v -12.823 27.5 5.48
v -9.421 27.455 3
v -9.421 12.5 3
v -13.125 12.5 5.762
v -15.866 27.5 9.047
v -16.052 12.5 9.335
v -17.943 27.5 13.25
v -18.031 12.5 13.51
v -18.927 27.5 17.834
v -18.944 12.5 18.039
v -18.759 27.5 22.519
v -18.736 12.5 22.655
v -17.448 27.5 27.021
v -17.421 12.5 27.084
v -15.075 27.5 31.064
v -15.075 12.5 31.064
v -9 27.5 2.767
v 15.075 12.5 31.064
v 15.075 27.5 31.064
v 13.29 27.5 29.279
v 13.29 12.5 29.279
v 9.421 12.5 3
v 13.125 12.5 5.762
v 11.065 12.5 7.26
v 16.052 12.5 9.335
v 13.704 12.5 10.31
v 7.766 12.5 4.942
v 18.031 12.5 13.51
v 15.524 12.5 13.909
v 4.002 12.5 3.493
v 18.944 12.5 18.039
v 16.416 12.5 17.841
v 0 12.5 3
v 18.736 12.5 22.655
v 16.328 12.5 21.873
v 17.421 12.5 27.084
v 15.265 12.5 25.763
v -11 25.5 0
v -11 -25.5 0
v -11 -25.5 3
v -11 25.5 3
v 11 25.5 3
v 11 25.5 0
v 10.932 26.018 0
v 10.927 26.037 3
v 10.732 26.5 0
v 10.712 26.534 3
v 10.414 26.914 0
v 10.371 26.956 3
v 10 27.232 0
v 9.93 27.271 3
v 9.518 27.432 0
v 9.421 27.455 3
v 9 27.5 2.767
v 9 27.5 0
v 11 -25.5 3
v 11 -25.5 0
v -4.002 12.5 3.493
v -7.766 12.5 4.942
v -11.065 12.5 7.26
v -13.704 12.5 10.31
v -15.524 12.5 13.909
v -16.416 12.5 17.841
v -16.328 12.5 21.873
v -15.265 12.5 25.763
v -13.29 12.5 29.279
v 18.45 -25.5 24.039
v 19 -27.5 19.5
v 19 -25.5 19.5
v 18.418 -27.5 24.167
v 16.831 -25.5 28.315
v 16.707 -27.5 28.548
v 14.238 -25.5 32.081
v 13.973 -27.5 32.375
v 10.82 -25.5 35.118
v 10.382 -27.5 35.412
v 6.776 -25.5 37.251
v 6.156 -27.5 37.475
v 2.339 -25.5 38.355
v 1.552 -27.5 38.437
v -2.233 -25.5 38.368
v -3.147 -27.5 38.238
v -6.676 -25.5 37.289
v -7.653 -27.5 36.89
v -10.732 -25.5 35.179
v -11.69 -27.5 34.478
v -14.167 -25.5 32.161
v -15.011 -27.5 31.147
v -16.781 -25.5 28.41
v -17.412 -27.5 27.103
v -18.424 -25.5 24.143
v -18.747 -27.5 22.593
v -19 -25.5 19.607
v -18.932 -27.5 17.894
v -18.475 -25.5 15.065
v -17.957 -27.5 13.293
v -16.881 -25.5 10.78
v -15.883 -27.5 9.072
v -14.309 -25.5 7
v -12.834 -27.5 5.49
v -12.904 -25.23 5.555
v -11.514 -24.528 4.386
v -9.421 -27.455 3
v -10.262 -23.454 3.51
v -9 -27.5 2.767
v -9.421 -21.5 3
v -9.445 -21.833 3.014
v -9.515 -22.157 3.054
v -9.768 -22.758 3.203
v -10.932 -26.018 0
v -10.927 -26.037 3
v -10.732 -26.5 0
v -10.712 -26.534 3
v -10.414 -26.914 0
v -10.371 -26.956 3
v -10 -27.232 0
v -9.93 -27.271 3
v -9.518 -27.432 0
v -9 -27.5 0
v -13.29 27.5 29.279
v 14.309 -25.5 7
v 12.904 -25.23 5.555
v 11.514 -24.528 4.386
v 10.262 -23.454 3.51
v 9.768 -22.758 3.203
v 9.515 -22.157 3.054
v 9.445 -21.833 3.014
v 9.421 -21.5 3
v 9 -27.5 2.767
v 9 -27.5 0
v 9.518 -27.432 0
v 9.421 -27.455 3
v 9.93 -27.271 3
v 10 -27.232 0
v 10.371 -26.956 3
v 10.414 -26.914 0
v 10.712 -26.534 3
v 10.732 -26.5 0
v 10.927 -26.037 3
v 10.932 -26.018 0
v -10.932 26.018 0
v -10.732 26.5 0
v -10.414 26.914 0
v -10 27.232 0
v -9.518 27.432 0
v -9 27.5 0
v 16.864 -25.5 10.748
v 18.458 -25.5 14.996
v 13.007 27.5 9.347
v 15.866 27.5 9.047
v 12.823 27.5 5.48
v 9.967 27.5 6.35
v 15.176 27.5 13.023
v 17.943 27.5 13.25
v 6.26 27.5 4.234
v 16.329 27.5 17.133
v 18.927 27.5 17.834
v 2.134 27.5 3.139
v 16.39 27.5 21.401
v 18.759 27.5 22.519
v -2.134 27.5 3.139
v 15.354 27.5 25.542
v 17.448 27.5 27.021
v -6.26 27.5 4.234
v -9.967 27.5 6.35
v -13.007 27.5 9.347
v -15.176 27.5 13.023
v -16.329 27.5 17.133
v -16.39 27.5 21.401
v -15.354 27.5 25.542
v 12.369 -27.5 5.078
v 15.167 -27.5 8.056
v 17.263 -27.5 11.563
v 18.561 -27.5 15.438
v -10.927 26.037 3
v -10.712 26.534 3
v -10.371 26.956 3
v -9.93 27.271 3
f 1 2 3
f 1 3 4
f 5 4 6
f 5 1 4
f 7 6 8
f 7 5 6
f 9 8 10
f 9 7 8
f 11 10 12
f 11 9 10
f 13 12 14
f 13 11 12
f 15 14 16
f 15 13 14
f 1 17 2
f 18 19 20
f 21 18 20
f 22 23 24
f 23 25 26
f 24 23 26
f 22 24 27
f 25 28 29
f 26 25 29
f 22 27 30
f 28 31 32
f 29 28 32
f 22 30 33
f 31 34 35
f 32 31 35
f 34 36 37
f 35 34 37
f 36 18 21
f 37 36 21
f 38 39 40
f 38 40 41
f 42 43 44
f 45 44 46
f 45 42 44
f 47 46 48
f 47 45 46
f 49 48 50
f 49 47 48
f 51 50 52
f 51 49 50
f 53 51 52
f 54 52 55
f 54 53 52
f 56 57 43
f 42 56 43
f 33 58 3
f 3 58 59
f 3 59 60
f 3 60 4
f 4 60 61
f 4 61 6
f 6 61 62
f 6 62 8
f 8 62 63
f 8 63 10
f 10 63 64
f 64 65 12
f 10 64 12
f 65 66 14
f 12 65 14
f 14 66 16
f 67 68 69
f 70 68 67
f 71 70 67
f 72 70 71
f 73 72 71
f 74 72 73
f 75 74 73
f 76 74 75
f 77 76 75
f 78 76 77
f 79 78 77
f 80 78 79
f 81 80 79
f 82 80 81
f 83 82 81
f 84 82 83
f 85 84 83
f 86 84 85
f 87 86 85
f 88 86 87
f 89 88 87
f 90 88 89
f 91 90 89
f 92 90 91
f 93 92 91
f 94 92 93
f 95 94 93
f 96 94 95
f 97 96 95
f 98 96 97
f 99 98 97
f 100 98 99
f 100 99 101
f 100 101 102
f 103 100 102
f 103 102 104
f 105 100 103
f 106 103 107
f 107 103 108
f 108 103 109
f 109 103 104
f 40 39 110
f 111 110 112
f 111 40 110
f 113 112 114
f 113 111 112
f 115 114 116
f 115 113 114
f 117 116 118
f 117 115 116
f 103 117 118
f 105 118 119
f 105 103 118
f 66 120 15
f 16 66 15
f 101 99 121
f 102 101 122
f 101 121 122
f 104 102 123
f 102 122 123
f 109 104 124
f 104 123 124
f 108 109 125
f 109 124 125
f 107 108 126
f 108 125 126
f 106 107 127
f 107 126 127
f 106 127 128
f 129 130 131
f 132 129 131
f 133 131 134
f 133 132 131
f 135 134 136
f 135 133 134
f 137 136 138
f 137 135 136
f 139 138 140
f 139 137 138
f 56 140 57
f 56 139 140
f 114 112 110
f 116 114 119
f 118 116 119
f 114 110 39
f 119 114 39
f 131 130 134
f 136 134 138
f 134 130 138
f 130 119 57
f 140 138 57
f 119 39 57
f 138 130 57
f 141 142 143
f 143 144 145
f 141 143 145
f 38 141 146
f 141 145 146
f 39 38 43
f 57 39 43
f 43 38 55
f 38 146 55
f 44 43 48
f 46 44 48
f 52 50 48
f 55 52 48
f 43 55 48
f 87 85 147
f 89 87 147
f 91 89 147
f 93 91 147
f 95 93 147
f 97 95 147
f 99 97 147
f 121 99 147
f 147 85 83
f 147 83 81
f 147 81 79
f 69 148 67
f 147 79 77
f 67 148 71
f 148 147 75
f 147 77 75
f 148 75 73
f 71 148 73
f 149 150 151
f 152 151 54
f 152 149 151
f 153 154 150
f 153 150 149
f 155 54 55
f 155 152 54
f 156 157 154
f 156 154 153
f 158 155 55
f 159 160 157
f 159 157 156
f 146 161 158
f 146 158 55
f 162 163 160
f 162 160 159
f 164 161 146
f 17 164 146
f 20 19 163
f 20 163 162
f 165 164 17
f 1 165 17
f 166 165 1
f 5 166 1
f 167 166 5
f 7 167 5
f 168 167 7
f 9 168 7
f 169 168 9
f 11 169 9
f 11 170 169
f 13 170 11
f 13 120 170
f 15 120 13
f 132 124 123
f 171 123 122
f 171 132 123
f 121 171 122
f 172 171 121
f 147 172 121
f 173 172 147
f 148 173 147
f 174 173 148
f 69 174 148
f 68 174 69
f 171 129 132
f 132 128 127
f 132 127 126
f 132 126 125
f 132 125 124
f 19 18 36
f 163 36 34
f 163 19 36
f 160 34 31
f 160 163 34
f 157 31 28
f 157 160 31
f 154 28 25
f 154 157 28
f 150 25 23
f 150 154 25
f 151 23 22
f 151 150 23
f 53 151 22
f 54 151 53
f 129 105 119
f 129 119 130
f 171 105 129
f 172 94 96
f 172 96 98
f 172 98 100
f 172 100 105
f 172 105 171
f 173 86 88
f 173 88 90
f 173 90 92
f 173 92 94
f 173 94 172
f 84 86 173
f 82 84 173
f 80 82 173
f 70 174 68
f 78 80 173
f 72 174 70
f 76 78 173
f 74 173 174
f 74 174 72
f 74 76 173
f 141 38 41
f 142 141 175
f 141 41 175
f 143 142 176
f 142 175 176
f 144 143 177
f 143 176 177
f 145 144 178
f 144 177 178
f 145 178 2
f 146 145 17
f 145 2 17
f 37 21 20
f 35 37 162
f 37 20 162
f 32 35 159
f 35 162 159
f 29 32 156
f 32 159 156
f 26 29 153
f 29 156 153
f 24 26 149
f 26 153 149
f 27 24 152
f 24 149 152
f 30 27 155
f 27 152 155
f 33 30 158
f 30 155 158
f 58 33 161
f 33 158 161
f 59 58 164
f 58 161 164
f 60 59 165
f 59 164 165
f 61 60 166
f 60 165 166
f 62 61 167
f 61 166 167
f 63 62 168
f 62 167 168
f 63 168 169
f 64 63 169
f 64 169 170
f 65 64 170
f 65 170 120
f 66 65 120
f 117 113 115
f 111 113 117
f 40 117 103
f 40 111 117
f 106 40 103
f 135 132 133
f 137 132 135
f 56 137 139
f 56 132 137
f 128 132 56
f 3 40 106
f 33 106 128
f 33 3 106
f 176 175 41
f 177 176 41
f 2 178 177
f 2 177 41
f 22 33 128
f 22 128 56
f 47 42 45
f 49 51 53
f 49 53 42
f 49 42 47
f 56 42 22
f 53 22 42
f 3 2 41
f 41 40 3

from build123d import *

# Parameters (mm, degrees)
F0_W     = 22
F0_H     = 55
F1_DEPTH = 3
F2_R     = 2
F4_DEPTH = 2
F5_R     = 4
F6_R     = 19
F6_R_2   = 16.5
F7_DEPTH = 15
F9_DEPTH = 25


with BuildPart() as f1:
    # F0 (on Top) → F1 (new body)
    with BuildSketch(Plane.XY):
        Rectangle(F0_W, F0_H)
    extrude(amount=F1_DEPTH)

    # F2
    f2_edges = [f1.edges().sort_by_distance(p)[0] for p in [
        (-11, 27.5, 1.5),
        (11, 27.5, 1.5),
        (11, -27.5, 1.5),
        (-11, -27.5, 1.5),
    ]]
    fillet(f2_edges, radius=F2_R)

    # F3 (on face) → F4 (join)
    with BuildSketch(Plane.XZ.offset(27.5)):
        with BuildLine():
            Line((-9, 3), (-4.24e-08, 3))
            Line((-4.24e-08, 3), (9, 3))
            Line((9, 3), (9, 2.7667994693))
            ThreePointArc((9, 2.7667994693), (16.3095064303, 9.7532056552), (19, 19.5))
            ThreePointArc((19, 19.5), (-9.7467943448, 35.8095064303), (-9, 2.7667994693))
            Line((-9, 2.7667994693), (-9, 3))
        make_face()
        with BuildLine():
            ThreePointArc((-4.24e-08, 3), (-11.6672618746, 31.1672619046), (16.5, 19.5))
            ThreePointArc((16.5, 19.5), (11.6672618746, 7.8327380954), (-4.24e-08, 3))
        make_face(mode=Mode.SUBTRACT)
        with BuildLine():
            ThreePointArc((-4.24e-08, 3), (11.6672618746, 7.8327380954), (16.5, 19.5))
            ThreePointArc((16.5, 19.5), (-11.6672618746, 31.1672619046), (-4.24e-08, 3))
        make_face()
    extrude(amount=-F4_DEPTH)

    # F5
    f5_edges = [f1.edges().sort_by_distance(p)[0] for p in [
        (0, -25.5, 3),
    ]]
    fillet(f5_edges, radius=F5_R)

    # F6 (on face) → F7 (join)
    with BuildSketch(Plane(origin=(0, 27.5, 0), x_dir=(-1, 0, 0), z_dir=(0, 1, 0))):
        with Locations((0, 19.5)):
            Circle(F6_R)
        with Locations((0, 19.5)):
            Circle(F6_R_2, mode=Mode.SUBTRACT)
    extrude(amount=-F7_DEPTH)

    # F8 (on face) → F9 (cut)
    with BuildSketch(Plane(origin=(0, 27.5, 0), x_dir=(-1, 0, 0), z_dir=(0, 1, 0))):
        Polygon((-10.5, 26.4886836855), (0, 26.4886836855), (10.5, 26.4886836855), (23.2279220614, 39.2166057468), (-23.2279220614, 39.2166057468), align=None)
    extrude(amount=-F9_DEPTH, mode=Mode.SUBTRACT)


solid = f1.part
